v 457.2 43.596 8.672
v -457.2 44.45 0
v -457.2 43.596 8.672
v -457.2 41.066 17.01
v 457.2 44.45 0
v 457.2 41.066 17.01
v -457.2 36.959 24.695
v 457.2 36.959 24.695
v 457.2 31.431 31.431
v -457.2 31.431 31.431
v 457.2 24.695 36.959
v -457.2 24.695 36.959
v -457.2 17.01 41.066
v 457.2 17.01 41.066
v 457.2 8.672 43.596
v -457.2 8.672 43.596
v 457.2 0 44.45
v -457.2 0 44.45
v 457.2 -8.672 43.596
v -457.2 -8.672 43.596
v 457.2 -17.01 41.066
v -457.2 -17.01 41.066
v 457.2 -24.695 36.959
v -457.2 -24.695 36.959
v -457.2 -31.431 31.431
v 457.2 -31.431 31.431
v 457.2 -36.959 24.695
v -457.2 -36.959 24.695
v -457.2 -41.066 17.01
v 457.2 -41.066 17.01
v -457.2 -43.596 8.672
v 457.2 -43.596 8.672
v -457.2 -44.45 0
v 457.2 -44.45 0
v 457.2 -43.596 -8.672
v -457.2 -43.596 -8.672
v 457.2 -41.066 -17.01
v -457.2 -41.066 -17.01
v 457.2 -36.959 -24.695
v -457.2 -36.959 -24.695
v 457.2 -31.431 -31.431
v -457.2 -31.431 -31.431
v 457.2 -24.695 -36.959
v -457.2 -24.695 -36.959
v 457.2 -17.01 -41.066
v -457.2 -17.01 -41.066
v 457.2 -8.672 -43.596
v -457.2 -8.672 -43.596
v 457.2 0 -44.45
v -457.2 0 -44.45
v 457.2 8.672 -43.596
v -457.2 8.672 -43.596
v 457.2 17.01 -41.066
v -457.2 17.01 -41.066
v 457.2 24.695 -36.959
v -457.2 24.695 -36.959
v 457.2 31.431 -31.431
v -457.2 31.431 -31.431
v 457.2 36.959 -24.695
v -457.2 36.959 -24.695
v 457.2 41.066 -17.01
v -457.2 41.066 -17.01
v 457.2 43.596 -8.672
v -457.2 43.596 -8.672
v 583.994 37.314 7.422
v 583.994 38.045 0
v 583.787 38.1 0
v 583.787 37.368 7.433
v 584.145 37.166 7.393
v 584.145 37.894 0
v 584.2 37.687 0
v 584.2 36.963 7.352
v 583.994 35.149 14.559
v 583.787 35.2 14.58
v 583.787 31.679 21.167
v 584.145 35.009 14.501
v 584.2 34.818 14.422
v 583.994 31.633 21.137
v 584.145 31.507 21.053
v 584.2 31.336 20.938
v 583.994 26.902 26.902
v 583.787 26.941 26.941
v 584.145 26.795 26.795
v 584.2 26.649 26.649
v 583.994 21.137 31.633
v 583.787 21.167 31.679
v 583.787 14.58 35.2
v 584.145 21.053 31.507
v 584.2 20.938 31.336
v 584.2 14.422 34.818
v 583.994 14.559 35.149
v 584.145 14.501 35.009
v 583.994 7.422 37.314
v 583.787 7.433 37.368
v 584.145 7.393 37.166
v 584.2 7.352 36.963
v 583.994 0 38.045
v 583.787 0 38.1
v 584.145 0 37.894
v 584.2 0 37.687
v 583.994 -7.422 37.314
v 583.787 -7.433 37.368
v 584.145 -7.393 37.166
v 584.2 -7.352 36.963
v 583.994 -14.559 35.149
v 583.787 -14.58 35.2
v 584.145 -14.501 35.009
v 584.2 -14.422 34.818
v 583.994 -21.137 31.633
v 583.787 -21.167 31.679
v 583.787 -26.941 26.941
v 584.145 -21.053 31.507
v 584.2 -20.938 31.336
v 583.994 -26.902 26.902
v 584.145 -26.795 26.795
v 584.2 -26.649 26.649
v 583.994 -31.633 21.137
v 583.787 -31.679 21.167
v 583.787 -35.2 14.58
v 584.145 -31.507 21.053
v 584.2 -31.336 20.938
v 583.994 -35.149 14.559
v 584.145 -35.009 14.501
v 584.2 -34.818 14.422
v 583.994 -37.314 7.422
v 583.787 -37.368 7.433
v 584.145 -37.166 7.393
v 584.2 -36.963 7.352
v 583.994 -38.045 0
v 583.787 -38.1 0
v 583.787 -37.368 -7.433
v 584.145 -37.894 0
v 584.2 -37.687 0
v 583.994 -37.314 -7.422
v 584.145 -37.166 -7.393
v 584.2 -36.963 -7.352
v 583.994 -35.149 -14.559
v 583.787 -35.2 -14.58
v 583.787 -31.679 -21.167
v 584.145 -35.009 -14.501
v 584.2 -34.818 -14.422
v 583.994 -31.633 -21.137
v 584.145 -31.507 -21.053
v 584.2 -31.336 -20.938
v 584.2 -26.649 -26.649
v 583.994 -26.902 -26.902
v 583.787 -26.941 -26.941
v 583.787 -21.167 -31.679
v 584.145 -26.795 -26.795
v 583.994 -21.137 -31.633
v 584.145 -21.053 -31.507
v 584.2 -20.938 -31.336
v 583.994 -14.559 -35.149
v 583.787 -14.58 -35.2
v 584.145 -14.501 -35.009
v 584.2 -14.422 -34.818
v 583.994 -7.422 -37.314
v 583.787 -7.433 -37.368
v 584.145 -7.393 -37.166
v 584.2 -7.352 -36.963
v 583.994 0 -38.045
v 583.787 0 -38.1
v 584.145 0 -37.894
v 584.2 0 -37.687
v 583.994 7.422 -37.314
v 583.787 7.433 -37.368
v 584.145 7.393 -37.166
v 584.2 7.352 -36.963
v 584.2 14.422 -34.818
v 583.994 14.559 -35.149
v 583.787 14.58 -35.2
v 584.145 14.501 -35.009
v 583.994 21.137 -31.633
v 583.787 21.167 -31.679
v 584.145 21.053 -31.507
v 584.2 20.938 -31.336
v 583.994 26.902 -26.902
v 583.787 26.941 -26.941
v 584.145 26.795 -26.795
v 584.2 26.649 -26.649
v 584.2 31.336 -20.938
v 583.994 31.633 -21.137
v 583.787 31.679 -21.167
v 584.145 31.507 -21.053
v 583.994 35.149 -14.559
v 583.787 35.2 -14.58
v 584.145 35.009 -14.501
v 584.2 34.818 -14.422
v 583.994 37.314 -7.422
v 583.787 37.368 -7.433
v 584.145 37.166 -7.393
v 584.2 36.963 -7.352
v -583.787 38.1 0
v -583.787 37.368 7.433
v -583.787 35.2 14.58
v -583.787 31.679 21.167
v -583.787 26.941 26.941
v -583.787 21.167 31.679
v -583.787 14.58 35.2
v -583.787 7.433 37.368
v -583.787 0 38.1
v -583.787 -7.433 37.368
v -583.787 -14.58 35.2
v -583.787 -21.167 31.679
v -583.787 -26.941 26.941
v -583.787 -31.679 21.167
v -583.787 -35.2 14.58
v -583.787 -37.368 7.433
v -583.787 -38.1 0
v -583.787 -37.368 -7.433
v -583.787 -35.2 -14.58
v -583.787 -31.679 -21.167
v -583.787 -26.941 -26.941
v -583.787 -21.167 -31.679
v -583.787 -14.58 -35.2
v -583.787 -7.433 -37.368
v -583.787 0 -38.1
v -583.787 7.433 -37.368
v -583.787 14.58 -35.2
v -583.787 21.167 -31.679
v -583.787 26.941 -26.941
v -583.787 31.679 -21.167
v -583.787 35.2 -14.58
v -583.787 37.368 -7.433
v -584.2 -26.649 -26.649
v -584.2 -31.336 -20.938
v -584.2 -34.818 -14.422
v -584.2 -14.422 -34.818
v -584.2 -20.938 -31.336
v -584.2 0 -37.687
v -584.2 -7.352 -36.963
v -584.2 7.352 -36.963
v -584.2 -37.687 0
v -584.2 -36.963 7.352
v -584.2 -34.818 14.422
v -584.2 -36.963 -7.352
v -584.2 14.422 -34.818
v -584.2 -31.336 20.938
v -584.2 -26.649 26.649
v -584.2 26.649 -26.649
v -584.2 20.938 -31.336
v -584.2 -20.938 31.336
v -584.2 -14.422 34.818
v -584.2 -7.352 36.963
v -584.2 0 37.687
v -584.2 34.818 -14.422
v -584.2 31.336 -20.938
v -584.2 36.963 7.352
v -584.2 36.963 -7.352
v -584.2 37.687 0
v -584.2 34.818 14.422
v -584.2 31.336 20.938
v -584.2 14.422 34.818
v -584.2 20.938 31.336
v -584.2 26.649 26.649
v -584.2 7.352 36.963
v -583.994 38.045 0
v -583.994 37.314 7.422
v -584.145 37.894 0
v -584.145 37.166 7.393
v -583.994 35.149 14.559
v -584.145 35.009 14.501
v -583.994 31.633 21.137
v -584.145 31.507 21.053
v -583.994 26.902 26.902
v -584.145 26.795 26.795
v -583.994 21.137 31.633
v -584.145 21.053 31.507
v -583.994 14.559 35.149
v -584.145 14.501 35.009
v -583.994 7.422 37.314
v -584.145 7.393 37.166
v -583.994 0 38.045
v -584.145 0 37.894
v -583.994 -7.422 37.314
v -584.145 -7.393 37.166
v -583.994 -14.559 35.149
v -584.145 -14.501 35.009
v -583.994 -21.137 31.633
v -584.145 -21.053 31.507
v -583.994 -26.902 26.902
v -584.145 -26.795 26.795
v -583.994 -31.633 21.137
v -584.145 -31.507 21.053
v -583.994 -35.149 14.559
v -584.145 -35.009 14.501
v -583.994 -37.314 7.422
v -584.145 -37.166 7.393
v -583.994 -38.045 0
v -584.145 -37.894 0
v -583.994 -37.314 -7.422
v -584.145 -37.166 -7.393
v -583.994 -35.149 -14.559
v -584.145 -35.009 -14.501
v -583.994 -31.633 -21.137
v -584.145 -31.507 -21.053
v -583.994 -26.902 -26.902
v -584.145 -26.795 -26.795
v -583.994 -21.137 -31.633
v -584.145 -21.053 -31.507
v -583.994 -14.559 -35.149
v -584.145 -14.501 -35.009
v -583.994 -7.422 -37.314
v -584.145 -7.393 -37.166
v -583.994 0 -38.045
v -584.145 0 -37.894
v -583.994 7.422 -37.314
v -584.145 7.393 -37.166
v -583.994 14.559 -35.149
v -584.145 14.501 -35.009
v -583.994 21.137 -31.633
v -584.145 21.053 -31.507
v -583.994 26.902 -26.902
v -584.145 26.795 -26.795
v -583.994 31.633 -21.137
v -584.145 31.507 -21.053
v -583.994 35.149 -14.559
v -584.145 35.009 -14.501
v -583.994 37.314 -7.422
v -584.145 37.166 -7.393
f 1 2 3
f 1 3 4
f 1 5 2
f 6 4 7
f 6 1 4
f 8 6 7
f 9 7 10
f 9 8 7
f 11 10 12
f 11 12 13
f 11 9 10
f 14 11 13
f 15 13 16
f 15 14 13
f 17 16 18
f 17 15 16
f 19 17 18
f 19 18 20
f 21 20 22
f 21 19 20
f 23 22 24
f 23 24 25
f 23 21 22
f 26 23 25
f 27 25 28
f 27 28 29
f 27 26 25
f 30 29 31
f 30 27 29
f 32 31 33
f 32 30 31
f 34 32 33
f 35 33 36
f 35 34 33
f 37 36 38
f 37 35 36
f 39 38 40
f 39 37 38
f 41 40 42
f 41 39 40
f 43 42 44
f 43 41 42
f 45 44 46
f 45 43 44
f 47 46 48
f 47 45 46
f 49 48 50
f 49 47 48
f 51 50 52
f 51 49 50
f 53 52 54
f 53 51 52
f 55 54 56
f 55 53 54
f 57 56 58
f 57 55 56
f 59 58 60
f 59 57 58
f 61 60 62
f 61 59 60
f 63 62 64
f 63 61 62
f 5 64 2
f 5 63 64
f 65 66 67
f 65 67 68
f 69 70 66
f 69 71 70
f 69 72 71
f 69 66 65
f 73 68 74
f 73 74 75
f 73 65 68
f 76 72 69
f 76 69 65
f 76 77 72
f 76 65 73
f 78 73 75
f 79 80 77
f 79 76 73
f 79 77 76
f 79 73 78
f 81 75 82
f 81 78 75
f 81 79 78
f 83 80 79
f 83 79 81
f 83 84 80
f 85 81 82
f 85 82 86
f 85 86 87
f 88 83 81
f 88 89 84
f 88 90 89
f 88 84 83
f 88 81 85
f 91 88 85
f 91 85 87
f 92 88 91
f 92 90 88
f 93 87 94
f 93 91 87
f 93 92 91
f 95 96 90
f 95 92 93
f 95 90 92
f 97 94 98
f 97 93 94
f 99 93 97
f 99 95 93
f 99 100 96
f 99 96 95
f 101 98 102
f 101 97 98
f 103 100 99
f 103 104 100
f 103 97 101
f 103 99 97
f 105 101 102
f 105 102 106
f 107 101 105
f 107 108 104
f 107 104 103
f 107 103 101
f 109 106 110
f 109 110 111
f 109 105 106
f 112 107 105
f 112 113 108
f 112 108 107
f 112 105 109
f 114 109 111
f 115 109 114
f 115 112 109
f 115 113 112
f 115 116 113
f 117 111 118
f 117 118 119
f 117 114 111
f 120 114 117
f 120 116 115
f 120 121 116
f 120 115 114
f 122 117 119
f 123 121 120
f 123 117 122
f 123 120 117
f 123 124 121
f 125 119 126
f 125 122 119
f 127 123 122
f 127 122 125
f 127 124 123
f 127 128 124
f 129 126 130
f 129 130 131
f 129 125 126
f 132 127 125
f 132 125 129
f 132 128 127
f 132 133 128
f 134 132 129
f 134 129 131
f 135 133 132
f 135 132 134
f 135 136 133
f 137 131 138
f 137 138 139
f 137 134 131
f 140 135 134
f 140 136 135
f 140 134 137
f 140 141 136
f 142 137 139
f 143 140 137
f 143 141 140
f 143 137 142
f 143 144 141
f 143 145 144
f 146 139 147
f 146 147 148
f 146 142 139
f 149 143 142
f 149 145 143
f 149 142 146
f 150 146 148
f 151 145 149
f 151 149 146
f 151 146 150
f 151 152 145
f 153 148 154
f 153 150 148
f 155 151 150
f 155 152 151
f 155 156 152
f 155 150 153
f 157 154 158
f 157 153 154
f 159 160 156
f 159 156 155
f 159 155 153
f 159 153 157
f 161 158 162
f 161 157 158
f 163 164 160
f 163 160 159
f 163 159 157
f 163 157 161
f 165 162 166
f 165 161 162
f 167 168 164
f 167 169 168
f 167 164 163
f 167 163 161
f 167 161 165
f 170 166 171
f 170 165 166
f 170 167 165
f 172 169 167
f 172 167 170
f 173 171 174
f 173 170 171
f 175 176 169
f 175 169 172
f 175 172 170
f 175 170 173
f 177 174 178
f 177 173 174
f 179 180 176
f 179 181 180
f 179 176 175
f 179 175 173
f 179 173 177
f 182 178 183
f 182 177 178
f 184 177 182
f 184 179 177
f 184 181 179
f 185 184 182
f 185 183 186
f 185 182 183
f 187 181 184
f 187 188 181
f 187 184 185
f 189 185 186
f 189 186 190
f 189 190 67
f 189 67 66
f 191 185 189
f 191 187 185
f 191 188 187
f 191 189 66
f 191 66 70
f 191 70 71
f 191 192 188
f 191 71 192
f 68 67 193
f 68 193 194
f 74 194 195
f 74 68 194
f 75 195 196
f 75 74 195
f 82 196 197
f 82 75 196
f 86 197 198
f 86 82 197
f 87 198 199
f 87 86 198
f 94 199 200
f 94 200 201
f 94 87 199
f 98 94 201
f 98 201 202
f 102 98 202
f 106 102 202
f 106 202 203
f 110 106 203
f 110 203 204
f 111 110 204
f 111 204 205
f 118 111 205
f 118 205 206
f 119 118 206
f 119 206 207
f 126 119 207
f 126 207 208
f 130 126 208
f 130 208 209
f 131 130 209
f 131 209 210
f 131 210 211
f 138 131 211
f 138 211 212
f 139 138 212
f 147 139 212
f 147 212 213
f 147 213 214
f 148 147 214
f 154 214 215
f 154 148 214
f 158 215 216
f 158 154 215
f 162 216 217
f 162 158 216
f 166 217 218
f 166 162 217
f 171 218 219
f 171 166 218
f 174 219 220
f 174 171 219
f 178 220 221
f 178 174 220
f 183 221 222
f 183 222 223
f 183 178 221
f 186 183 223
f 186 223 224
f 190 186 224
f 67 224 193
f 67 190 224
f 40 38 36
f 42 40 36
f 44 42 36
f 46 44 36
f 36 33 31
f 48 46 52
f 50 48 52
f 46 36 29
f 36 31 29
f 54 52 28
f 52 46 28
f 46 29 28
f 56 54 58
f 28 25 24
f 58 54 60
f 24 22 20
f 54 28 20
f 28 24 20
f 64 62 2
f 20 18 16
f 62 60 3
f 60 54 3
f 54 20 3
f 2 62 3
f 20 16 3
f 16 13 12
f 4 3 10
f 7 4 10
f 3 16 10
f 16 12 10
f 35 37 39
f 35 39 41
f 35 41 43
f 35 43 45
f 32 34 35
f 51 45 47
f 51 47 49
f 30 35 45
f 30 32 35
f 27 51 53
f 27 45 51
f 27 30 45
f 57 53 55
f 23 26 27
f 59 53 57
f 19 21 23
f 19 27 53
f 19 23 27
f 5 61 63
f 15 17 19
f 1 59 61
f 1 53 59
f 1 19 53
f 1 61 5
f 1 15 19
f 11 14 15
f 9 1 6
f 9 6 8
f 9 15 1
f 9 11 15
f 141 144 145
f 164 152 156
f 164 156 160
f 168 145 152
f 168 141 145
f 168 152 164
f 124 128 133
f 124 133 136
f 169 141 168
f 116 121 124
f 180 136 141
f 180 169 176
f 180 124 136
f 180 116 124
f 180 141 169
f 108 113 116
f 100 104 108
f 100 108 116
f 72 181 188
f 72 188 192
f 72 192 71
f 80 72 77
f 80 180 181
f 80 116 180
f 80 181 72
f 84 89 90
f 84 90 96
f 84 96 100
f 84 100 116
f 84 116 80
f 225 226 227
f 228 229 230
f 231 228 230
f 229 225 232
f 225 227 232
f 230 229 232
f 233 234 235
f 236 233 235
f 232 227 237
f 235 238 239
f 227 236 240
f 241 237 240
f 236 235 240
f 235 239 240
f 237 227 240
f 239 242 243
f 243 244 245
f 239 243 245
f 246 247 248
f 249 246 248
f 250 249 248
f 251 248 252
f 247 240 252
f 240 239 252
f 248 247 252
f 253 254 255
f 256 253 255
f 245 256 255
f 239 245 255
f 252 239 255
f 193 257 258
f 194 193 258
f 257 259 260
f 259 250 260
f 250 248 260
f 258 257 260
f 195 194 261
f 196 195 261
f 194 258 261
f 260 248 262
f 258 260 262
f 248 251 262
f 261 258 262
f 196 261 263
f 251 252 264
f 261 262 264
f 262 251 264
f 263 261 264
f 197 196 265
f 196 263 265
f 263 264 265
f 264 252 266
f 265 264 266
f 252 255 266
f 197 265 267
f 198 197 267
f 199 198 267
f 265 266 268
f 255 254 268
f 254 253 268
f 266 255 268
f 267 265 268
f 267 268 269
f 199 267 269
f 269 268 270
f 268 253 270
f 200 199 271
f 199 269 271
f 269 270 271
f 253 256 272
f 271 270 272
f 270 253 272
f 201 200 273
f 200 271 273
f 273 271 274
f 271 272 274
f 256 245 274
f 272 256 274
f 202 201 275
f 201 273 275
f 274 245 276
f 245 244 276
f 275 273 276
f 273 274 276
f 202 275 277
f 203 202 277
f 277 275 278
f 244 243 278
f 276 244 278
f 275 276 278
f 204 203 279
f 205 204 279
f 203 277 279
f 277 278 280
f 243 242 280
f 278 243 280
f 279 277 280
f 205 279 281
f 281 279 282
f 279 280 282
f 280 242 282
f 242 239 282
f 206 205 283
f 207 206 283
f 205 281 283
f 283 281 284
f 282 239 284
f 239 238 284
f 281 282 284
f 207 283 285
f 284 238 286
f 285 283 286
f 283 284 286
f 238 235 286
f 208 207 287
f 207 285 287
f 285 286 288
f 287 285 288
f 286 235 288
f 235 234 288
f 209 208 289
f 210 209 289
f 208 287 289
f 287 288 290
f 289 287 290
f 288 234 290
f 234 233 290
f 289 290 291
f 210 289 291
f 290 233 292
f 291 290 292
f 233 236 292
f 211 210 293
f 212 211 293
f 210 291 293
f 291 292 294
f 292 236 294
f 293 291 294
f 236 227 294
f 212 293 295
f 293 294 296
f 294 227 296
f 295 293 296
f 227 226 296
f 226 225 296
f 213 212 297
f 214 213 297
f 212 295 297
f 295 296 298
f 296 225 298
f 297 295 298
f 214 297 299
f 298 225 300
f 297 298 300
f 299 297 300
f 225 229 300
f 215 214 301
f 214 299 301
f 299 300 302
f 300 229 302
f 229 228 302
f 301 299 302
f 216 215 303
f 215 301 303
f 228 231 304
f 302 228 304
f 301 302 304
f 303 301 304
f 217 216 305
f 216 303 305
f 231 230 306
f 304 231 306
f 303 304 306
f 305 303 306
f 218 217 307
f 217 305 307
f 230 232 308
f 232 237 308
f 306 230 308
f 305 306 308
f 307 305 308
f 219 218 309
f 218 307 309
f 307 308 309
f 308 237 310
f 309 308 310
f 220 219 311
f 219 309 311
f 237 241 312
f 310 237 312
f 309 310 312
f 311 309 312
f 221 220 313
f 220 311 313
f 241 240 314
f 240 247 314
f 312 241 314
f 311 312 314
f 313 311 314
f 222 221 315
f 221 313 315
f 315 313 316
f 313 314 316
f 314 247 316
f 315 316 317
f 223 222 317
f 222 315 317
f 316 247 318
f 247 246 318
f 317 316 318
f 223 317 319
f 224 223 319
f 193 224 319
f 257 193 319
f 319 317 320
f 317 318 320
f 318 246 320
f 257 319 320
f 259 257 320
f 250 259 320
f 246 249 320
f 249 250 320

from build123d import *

# Parameters (mm, degrees)
F0_R     = 38.1
F1_DEPTH = 584.2
F2_R     = 0.41275
F3_R     = 44.45
F4_DEPTH = 457.2


with BuildPart() as f1:
    # F0 (on Right) → F1 (new body, symmetric)
    with BuildSketch(Plane.YZ):
        Circle(F0_R)
    extrude(amount=F1_DEPTH, both=True)

    # F2
    f2_edges = [f1.edges().sort_by_distance(p)[0] for p in [
        (-584.2, -38.1, 0),
        (584.2, -38.1, 0),
    ]]
    fillet(f2_edges, radius=F2_R)


with BuildPart() as f4:
    # F3 (on Right) → F4 (new body, symmetric)
    with BuildSketch(Plane.YZ):
        Circle(F3_R)
    extrude(amount=F4_DEPTH, both=True)


solid = Compound([f1.part, f4.part])
